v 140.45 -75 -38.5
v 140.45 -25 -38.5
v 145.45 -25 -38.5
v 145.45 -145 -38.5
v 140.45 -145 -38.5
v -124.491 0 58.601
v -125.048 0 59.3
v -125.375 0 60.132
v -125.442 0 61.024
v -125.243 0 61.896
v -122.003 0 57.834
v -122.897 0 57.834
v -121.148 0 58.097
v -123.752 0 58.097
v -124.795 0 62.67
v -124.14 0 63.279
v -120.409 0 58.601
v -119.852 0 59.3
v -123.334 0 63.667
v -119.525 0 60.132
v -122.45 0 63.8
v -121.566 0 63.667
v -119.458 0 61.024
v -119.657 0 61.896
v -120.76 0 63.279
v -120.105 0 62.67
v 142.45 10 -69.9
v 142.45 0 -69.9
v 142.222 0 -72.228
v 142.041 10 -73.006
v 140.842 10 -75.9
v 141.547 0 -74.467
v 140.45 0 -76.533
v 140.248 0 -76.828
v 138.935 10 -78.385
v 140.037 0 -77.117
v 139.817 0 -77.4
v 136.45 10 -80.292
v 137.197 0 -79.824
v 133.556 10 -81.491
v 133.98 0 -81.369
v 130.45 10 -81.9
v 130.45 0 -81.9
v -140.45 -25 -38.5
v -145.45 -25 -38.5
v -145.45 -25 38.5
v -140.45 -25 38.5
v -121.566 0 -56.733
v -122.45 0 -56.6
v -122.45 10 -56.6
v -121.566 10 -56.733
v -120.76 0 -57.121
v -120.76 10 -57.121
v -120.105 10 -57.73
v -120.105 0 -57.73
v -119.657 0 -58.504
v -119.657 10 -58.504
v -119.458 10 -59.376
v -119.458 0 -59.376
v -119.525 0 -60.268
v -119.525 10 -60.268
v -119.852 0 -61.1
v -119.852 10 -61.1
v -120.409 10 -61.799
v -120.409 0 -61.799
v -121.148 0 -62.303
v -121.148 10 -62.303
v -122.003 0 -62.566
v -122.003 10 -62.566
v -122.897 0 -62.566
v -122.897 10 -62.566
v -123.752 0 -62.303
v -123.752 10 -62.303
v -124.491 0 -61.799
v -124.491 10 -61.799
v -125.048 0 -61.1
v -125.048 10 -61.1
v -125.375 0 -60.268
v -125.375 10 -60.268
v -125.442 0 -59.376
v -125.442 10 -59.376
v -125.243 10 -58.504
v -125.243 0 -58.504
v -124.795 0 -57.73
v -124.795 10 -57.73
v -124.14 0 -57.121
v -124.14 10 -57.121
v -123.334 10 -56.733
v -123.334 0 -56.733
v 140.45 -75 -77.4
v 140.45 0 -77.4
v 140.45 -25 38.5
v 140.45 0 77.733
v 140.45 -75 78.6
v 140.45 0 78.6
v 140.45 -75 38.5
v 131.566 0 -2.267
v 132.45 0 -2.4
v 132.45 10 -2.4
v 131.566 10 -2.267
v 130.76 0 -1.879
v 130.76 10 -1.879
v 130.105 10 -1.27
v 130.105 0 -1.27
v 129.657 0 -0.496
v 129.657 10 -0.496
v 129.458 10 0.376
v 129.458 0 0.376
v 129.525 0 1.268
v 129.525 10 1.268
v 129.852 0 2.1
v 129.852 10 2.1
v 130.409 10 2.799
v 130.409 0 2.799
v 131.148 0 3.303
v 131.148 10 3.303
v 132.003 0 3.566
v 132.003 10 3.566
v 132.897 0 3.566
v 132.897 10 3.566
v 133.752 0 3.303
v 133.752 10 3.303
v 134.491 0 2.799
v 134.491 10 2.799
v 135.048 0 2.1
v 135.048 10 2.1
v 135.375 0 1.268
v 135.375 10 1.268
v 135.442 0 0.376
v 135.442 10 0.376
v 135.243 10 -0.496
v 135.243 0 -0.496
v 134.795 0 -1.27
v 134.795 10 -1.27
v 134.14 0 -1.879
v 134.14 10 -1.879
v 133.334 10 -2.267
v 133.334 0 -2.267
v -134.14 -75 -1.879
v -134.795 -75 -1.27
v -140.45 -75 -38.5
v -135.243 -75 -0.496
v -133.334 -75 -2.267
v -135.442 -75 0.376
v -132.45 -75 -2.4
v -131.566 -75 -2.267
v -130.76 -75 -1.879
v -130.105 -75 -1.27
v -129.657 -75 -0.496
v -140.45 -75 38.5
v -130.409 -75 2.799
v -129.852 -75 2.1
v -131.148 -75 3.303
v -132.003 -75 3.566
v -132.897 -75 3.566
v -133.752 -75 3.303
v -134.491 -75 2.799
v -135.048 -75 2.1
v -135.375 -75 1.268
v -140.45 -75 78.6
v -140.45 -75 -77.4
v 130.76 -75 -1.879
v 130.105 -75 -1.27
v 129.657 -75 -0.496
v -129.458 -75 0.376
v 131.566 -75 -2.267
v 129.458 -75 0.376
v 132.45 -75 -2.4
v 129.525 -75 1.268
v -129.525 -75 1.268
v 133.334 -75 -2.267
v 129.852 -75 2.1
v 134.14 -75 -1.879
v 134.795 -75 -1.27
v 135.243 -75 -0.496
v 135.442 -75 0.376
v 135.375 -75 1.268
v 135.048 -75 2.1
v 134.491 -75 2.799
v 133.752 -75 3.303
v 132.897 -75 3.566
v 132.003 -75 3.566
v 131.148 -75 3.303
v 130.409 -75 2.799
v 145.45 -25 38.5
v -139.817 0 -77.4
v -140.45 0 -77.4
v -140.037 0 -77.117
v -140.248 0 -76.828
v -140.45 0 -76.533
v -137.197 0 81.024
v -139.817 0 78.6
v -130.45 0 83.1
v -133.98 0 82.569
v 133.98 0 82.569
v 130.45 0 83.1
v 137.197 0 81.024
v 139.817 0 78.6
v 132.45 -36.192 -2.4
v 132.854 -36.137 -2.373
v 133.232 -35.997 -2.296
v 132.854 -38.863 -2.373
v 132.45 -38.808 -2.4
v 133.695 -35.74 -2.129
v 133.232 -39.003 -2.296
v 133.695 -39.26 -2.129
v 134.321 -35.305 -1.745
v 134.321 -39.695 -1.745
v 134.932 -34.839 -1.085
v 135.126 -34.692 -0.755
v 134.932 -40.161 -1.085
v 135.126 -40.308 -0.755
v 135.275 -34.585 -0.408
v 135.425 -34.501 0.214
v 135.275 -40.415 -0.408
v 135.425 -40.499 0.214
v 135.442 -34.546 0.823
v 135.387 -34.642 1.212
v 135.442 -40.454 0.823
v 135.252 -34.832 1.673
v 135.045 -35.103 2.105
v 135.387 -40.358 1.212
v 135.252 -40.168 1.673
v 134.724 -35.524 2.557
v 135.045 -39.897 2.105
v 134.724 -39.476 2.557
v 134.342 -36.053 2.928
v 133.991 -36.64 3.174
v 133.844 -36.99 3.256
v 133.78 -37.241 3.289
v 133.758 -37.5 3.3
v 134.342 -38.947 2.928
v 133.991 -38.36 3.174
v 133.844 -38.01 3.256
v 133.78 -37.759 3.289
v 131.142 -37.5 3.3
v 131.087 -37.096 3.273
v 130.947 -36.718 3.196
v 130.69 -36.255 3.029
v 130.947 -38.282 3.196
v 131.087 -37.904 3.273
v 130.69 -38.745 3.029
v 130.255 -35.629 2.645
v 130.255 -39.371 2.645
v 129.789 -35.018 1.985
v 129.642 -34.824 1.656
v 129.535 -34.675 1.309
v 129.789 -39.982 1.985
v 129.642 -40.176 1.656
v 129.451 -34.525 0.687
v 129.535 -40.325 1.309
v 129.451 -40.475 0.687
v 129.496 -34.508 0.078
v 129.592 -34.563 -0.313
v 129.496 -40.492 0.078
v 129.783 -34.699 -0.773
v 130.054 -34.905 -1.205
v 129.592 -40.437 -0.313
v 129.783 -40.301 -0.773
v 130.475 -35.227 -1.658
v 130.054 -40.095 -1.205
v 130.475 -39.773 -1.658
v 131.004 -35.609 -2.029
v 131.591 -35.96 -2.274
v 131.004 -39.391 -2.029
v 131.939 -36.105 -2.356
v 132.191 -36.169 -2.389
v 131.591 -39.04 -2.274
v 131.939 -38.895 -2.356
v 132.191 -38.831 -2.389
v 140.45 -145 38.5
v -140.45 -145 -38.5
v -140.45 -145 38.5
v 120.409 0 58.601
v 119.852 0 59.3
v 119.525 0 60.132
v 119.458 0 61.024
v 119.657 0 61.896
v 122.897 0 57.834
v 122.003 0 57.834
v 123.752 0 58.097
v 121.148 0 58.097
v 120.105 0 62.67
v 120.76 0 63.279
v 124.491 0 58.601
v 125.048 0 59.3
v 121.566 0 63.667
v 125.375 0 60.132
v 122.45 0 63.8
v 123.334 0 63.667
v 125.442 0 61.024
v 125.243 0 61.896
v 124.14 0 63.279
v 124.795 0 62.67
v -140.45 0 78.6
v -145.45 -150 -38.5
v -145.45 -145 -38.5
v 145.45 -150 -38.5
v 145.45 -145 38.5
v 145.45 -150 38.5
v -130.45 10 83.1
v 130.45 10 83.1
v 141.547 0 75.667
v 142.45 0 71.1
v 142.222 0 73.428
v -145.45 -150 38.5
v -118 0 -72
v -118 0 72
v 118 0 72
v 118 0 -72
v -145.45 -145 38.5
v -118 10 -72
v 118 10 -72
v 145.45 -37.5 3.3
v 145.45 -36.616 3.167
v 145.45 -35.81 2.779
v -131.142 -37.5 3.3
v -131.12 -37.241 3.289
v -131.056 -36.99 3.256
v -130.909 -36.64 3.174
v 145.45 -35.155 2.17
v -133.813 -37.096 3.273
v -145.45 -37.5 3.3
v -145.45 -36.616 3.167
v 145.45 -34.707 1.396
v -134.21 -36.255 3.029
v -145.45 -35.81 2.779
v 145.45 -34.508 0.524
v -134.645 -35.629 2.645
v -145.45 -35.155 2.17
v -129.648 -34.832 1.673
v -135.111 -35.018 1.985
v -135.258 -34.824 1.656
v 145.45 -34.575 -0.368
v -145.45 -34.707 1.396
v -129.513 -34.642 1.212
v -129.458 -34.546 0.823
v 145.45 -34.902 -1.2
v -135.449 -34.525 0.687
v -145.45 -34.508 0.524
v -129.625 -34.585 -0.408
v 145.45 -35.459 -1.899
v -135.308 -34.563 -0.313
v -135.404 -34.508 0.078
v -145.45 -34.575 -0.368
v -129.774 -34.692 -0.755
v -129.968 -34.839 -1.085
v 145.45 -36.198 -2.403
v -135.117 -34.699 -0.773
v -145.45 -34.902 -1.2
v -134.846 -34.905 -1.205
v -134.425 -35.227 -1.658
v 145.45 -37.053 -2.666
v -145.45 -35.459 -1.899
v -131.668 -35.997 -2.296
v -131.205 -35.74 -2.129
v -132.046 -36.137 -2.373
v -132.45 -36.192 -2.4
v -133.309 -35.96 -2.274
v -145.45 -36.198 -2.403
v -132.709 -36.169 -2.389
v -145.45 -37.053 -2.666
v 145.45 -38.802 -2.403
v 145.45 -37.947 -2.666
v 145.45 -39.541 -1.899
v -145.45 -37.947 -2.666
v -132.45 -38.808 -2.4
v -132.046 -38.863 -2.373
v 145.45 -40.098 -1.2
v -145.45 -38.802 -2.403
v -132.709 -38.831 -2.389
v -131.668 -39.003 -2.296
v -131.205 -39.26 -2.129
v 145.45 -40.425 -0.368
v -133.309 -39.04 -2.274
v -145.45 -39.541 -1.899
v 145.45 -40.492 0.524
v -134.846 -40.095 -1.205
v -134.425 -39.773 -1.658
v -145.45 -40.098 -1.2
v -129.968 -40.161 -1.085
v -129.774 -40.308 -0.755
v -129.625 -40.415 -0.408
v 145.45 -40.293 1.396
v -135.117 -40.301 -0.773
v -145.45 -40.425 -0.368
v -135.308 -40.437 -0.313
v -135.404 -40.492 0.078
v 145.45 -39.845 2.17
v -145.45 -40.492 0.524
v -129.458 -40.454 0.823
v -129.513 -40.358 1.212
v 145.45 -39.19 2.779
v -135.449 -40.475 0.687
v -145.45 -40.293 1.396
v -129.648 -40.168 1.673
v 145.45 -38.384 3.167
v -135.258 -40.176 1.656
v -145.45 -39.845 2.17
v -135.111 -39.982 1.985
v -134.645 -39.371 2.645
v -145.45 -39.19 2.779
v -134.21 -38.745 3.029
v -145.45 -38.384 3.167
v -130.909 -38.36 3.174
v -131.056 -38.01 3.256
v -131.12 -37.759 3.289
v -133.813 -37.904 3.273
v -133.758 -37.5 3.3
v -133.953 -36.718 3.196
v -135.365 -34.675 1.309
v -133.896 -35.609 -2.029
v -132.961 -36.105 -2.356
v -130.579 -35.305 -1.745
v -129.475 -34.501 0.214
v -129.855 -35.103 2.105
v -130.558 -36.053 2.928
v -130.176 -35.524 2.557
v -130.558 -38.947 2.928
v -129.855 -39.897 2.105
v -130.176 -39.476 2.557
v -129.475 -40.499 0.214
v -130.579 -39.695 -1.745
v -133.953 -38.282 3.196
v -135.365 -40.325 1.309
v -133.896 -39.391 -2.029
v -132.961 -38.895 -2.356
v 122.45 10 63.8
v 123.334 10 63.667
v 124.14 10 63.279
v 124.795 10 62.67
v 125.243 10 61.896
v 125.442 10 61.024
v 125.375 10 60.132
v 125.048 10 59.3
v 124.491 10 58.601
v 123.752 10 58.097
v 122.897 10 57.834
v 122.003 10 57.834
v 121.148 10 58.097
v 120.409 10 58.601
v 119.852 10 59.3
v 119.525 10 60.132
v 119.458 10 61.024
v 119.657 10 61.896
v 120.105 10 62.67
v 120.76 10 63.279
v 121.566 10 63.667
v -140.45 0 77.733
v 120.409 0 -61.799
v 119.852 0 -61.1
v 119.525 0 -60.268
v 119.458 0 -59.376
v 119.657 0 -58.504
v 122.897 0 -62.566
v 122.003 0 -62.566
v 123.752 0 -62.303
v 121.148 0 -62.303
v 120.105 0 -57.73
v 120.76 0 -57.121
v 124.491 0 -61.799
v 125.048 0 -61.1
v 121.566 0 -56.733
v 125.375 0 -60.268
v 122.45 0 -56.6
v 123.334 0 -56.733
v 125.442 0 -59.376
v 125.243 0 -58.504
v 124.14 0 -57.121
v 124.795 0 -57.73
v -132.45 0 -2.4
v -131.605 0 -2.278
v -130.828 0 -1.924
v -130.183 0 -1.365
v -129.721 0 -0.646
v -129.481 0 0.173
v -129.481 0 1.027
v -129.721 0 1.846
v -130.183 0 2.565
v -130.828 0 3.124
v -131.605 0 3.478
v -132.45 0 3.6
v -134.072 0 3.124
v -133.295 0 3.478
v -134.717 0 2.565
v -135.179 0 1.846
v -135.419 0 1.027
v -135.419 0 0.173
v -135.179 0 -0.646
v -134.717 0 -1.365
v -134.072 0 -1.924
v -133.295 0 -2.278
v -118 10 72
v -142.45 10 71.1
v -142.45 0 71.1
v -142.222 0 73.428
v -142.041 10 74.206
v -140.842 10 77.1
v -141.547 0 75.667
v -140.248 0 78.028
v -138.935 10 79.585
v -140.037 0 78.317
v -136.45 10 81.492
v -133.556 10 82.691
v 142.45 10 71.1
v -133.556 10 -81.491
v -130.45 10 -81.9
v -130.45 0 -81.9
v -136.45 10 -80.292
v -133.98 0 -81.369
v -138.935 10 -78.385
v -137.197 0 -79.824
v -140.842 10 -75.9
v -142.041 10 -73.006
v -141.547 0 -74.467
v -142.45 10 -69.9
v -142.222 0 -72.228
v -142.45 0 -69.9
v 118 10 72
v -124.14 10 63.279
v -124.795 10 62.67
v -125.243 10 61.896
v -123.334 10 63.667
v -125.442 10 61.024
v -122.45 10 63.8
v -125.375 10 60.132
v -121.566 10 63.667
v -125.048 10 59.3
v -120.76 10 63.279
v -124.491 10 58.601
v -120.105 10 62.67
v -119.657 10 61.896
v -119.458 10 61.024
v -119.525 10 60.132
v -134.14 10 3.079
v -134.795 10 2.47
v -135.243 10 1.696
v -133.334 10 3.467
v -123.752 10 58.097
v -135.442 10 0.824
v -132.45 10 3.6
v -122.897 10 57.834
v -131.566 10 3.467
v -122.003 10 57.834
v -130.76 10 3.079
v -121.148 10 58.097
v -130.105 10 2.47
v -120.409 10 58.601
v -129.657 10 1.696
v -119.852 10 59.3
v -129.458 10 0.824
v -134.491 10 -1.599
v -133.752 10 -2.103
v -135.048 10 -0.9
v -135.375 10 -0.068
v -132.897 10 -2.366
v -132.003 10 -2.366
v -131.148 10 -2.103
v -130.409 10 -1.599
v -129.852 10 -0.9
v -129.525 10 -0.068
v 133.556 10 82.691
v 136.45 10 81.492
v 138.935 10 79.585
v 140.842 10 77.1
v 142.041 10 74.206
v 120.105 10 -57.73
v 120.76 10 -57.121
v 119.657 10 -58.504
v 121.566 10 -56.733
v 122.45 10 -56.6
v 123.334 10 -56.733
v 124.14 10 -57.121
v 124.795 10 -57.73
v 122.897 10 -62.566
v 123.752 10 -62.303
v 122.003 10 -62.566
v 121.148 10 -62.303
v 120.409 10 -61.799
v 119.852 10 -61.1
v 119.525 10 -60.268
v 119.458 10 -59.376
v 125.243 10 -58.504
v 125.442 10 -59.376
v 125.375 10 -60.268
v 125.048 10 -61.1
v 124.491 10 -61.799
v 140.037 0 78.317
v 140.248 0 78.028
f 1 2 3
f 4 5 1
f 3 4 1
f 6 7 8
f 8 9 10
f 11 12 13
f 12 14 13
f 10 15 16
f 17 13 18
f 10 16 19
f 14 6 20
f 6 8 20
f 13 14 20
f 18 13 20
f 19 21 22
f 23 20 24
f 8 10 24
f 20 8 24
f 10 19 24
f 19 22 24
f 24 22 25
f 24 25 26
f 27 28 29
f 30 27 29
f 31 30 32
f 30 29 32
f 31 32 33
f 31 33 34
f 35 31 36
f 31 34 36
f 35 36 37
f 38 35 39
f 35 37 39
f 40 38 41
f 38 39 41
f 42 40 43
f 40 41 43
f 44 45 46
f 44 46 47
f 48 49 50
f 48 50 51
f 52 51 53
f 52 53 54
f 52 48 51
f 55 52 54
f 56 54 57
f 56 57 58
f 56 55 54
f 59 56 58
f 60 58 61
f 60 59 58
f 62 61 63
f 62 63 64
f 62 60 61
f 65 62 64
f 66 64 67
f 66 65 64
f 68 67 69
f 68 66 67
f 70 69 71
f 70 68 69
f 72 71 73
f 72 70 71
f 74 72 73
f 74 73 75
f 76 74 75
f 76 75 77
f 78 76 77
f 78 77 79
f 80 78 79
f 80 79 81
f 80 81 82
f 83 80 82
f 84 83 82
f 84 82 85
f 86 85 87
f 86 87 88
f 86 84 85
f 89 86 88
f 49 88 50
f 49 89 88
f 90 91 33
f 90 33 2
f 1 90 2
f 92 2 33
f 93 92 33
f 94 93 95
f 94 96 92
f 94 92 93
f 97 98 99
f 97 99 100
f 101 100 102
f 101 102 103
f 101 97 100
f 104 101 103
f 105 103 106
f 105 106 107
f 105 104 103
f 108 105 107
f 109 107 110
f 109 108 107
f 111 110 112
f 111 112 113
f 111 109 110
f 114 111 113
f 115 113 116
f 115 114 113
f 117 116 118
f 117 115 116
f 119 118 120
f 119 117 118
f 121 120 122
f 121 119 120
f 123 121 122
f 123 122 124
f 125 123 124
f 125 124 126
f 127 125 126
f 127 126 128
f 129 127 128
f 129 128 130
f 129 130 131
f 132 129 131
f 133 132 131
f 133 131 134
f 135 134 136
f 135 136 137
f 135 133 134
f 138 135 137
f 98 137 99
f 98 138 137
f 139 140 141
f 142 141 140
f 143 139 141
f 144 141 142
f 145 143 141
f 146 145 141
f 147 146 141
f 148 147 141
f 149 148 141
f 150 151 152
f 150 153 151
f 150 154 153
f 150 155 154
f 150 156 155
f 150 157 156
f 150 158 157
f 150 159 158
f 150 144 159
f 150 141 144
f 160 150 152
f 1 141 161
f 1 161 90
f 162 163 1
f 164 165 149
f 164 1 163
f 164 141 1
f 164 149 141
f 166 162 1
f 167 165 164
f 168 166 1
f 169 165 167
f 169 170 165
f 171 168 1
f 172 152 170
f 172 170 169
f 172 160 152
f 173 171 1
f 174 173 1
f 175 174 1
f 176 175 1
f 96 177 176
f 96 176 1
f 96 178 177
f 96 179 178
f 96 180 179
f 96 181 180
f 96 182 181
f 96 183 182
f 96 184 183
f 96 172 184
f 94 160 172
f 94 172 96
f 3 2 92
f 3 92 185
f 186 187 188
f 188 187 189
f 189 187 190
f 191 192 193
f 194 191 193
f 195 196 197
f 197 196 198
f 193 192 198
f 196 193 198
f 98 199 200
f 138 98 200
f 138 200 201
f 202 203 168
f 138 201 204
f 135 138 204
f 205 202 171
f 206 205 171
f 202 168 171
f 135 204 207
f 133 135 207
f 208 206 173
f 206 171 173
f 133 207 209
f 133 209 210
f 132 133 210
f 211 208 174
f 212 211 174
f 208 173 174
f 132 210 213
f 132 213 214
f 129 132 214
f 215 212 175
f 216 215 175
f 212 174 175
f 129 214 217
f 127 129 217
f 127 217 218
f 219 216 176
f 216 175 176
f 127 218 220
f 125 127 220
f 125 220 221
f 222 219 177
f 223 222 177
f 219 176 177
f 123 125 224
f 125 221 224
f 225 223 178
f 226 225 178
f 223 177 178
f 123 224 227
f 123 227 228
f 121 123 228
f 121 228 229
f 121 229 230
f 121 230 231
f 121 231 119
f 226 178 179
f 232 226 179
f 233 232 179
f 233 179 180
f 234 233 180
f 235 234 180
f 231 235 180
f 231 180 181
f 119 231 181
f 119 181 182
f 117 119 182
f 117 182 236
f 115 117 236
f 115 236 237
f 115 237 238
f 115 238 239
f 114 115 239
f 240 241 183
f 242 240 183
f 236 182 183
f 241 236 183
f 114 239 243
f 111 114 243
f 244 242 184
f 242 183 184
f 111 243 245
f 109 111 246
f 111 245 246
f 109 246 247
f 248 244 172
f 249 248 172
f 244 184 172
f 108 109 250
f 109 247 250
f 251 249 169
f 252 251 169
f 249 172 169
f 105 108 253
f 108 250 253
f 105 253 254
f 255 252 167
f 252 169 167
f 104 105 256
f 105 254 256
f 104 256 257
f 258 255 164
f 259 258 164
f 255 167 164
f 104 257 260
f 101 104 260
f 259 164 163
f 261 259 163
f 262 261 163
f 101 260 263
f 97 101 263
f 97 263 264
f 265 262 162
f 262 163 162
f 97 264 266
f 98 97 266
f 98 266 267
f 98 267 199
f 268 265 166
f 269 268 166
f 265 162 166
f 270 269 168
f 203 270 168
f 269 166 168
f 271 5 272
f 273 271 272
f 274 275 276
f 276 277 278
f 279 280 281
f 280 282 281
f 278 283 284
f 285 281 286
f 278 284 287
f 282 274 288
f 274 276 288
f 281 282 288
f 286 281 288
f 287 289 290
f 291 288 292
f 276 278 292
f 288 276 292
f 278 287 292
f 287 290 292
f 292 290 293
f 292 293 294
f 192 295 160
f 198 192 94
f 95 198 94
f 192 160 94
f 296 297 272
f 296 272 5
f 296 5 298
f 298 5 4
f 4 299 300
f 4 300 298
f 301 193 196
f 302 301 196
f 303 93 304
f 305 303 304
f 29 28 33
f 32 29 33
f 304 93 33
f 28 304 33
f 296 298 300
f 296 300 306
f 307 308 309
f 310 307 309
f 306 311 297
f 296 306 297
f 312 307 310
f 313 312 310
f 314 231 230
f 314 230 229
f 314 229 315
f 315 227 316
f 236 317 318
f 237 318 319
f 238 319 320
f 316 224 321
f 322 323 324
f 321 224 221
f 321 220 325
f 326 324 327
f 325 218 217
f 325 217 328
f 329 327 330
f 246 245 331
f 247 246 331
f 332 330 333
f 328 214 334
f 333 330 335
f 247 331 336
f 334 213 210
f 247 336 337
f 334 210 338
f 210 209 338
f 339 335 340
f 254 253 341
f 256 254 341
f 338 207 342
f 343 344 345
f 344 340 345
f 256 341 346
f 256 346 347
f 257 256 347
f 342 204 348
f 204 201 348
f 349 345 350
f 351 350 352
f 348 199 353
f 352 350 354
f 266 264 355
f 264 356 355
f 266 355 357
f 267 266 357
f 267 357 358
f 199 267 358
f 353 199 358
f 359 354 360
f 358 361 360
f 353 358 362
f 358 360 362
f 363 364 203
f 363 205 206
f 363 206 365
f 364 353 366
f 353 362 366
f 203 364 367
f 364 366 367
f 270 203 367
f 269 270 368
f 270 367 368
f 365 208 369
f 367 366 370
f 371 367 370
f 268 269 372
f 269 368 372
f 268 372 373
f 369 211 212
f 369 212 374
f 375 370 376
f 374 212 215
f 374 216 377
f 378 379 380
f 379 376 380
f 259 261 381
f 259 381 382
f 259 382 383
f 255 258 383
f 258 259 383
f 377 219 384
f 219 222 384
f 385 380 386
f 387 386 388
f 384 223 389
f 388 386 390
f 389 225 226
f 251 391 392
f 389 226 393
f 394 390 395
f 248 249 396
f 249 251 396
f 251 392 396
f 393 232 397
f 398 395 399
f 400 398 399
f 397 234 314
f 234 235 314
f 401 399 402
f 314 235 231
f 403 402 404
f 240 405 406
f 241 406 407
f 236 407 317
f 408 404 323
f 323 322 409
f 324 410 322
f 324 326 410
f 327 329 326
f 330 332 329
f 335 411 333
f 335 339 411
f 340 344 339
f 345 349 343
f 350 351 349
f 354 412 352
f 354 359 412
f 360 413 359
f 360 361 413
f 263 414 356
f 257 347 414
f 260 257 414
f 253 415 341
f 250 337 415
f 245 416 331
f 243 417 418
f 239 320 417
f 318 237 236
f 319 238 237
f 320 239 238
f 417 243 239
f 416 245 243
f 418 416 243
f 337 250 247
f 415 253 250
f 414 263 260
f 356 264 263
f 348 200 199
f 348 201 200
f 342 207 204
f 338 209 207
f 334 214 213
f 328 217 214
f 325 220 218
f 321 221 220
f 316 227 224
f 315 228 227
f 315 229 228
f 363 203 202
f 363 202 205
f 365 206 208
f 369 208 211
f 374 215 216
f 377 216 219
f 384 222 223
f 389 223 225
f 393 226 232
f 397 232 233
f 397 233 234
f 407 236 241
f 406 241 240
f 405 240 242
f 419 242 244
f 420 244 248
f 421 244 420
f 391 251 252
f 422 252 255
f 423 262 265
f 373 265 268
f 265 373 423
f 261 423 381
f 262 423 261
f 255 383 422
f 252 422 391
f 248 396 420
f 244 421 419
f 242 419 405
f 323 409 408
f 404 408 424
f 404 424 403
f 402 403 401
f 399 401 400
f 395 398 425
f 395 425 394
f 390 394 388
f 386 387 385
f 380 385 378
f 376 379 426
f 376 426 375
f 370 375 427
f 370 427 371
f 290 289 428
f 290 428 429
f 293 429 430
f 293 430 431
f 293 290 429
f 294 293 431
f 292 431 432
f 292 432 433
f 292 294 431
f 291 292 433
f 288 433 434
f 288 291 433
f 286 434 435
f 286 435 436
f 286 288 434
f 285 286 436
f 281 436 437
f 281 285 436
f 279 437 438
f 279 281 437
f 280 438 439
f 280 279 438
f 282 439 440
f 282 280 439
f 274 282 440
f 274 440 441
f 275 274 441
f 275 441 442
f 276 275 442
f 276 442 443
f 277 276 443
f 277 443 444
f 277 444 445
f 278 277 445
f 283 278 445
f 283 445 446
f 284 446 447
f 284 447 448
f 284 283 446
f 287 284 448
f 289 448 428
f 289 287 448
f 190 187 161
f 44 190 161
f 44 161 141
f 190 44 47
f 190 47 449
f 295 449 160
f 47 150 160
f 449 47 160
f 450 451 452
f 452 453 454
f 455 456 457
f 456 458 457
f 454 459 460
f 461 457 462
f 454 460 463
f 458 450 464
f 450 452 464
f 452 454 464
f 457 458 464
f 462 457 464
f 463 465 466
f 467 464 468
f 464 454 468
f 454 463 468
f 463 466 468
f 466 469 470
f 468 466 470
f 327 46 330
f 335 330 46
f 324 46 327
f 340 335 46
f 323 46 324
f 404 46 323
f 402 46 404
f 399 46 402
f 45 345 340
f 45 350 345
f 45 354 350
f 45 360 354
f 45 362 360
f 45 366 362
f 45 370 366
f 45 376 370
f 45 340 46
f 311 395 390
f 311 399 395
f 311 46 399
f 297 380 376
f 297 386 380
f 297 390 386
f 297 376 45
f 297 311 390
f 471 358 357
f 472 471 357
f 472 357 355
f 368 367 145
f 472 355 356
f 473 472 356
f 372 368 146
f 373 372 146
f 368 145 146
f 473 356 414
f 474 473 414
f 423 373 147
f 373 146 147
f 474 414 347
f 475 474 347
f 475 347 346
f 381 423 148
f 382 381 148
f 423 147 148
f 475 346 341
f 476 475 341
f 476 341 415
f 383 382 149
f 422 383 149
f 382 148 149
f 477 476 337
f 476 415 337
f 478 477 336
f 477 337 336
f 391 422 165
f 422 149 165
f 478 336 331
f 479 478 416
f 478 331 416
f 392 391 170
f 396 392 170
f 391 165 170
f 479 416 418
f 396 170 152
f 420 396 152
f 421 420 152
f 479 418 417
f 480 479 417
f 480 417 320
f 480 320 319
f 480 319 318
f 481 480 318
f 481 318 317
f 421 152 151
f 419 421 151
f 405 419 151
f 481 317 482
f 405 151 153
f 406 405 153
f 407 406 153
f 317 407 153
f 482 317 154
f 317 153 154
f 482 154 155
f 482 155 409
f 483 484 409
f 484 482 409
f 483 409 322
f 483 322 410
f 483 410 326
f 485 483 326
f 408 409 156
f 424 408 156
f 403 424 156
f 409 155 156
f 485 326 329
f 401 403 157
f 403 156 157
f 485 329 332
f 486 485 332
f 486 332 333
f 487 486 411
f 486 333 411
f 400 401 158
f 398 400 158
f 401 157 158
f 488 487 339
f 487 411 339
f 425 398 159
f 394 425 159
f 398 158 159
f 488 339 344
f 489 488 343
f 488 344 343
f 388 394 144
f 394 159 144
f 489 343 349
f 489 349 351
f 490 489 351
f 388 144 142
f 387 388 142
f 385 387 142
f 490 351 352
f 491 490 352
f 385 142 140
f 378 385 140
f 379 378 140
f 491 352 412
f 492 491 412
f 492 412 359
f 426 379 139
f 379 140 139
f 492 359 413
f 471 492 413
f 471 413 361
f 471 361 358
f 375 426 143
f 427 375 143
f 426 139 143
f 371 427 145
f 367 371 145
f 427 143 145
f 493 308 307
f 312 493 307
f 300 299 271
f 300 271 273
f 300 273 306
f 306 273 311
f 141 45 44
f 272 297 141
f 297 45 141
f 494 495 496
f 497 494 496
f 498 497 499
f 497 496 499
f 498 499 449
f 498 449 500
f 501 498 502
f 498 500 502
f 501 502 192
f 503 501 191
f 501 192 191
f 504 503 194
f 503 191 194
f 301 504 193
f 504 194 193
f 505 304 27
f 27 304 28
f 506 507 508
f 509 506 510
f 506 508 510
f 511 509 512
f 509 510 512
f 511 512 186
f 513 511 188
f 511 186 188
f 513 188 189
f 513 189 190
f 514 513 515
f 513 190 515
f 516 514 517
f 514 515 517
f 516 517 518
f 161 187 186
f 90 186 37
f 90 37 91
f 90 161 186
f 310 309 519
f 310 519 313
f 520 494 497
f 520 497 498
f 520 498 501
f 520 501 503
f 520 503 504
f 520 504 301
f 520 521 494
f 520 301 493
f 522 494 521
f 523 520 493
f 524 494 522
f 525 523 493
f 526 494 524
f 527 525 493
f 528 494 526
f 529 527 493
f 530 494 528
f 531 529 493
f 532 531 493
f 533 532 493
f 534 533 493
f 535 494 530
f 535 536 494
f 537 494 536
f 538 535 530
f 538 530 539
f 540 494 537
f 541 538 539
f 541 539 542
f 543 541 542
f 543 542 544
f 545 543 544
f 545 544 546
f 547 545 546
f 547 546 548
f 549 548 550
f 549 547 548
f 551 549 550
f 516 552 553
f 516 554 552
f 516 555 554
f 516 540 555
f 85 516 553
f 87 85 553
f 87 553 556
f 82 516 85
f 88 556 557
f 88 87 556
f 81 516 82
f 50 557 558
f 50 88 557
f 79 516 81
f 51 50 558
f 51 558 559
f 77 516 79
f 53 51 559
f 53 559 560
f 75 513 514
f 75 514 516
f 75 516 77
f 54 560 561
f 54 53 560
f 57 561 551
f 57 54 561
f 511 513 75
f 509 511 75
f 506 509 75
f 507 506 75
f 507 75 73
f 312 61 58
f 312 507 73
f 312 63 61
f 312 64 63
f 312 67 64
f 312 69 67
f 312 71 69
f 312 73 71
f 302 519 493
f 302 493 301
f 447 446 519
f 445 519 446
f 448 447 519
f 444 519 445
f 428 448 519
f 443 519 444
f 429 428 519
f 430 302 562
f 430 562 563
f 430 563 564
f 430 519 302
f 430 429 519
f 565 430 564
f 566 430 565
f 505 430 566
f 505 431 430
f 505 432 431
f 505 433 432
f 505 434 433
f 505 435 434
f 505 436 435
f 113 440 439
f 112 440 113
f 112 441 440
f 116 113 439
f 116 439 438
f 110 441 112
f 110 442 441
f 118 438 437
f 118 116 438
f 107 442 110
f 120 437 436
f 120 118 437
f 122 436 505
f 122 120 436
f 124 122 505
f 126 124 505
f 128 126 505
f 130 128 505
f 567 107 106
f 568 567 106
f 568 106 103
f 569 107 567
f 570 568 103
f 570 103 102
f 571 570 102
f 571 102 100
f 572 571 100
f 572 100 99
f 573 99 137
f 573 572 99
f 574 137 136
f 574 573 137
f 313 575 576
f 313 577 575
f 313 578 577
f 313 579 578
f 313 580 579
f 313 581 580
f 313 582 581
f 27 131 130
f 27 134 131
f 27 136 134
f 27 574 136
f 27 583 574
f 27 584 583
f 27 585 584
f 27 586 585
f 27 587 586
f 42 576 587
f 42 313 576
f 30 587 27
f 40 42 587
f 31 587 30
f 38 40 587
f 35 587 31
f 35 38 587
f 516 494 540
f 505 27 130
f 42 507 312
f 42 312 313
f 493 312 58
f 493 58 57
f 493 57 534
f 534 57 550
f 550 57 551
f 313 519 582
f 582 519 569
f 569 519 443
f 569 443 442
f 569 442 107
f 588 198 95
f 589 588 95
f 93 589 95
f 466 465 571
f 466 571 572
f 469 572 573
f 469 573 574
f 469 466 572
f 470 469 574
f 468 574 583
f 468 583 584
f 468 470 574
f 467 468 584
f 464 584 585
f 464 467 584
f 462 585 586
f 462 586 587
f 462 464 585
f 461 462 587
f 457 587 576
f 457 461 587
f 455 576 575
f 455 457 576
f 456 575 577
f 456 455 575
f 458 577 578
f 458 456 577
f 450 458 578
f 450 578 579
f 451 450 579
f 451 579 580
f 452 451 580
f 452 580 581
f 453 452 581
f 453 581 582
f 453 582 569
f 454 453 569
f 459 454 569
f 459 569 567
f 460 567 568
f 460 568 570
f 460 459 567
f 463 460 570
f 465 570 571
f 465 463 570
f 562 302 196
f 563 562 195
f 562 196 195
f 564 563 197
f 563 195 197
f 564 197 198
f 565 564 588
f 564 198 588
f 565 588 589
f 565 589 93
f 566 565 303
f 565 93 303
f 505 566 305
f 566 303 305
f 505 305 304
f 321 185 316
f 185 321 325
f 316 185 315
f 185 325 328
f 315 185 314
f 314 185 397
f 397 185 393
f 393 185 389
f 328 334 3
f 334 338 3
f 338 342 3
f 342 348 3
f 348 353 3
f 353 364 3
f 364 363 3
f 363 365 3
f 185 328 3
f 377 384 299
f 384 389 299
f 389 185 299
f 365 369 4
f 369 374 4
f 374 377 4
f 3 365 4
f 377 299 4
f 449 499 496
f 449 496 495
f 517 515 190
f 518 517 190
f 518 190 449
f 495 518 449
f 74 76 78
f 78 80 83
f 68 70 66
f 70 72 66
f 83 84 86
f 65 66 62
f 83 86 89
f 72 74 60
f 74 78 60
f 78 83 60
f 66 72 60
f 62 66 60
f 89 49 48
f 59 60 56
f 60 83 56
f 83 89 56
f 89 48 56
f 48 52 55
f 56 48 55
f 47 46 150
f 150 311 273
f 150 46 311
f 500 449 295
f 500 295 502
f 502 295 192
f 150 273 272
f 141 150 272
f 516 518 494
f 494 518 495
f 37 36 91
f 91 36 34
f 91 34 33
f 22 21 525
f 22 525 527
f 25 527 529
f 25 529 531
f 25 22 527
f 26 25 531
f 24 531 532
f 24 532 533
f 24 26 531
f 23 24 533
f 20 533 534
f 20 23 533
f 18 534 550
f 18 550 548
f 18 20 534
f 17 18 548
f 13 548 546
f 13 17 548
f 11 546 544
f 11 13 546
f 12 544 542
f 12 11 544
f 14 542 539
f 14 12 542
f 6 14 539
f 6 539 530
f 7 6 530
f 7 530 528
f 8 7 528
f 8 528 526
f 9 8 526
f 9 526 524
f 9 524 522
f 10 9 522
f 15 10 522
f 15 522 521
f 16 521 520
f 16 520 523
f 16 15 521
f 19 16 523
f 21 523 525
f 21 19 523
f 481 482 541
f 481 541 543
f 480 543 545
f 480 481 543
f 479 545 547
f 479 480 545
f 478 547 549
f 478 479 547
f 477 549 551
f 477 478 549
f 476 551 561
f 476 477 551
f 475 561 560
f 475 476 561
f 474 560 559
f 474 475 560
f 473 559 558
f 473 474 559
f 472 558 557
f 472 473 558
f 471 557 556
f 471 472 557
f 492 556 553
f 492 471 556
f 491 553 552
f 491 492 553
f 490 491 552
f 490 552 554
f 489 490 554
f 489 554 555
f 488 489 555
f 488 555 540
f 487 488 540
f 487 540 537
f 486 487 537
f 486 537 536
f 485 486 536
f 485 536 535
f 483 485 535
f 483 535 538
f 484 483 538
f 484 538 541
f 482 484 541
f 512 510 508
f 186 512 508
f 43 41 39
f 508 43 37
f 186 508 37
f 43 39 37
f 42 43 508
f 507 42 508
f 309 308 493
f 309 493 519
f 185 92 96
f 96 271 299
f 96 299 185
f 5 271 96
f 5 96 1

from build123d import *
from build123d.topology import SkipClean

# Parameters (mm, degrees)
SKETCH5_R           = 3
SKETCH5_W           = 236
SKETCH5_H           = 144
BOSS_EXTRUDE1_DEPTH = 10
BOSS_EXTRUDE2_START = 75
SKETCH7_W           = 280.9
SKETCH7_H           = 156
SKETCH7_R           = 3
BOSS_EXTRUDE2_DEPTH = 75
SKETCH9_W           = 5
SKETCH9_H           = 77
SKETCH9_W_2         = 280.9
BOSS_EXTRUDE3_DEPTH = 5
SKETCH10_W          = 5
SKETCH10_H          = 77
BOSS_EXTRUDE5_DEPTH = 120
SKETCH11_R          = 3
CUT_EXTRUDE1_DEPTH  = 1011


with BuildPart() as part:
    # Sketch5 → Boss-Extrude1 (new body)
    with BuildSketch(Plane(origin=(0, 0, 0), x_dir=(1, 0, 0), z_dir=(0, 1, 0))):
        with BuildLine():
            Line((-142.45, 69.9), (-142.45, -71.1))
            ThreePointArc((-142.45, -71.1), (-138.935281374, -79.585281374), (-130.45, -83.1))
            Line((-130.45, -83.1), (130.45, -83.1))
            ThreePointArc((130.45, -83.1), (138.935281374, -79.585281374), (142.45, -71.1))
            Line((142.45, -71.1), (142.45, 69.9))
            ThreePointArc((142.45, 69.9), (138.935281374, 78.385281374), (130.45, 81.9))
            Line((130.45, 81.9), (-130.45, 81.9))
            ThreePointArc((-130.45, 81.9), (-138.935281374, 78.385281374), (-142.45, 69.9))
        make_face()
        with Locations(Location((-122.45, 59.6, 0), (0, 0, 270))):
            Circle(SKETCH5_R, mode=Mode.SUBTRACT)
        with Locations(Location((-122.45, -60.8, 0), (0, 0, 270))):
            Circle(SKETCH5_R, mode=Mode.SUBTRACT)
        with Locations(Location((122.45, -60.8, 0), (0, 0, 270))):
            Circle(SKETCH5_R, mode=Mode.SUBTRACT)
        with Locations(Location((122.45, 59.6, 0), (0, 0, 270))):
            Circle(SKETCH5_R, mode=Mode.SUBTRACT)
        with Locations(Location((-132.45, -0.6, 0), (0, 0, 270))):
            Circle(SKETCH5_R, mode=Mode.SUBTRACT)
        with Locations(Location((132.45, -0.6, 0), (0, 0, 90))):
            Circle(SKETCH5_R, mode=Mode.SUBTRACT)
        Rectangle(SKETCH5_W, SKETCH5_H, mode=Mode.SUBTRACT)
    extrude(amount=BOSS_EXTRUDE1_DEPTH)

    # Sketch7 → Boss-Extrude2 (add)
    with SkipClean():  # the faces are left unmerged after this step: merging them gives an invalid solid
        with BuildSketch(Plane.XZ.offset(BOSS_EXTRUDE2_START)):
            with Locations((0, 0.6)):
                Rectangle(SKETCH7_W, SKETCH7_H)
            with Locations(Location((132.45, 0.6, 0), (0, 0, 270))):
                Circle(SKETCH7_R, mode=Mode.SUBTRACT)
            with Locations(Location((-132.45, 0.6, 0), (0, 0, 270))):
                Circle(SKETCH7_R, mode=Mode.SUBTRACT)
        extrude(amount=-BOSS_EXTRUDE2_DEPTH)



with BuildPart() as body_2:
    # Sketch9 → Boss-Extrude3 (new body)
    with BuildSketch(Plane(origin=(0, -145, 0), x_dir=(-1, 0, 0), z_dir=(0, -1, 0))):
        with Locations((-142.95, 0)):
            Rectangle(SKETCH9_W, SKETCH9_H)
        Rectangle(SKETCH9_W_2, SKETCH9_H)
        with Locations((142.95, 0)):
            Rectangle(SKETCH9_W, SKETCH9_H)
    extrude(amount=BOSS_EXTRUDE3_DEPTH)


with BuildPart() as part_1:
    with SkipClean():  # the faces are left unmerged after this step: merging them gives an invalid solid
        add(part.part)

        add(body_2.part)  # Boss-Extrude5 merges body 2
        # Sketch10 → Boss-Extrude5 (add)
        with BuildSketch(Plane(origin=(0, -145, 0), x_dir=(1, 0, 0), z_dir=(0, 1, 0))):
            with Locations((-142.95, 0)):
                Rectangle(SKETCH10_W, SKETCH10_H)
            with Locations((142.95, 0)):
                Rectangle(SKETCH10_W, SKETCH10_H)
        extrude(amount=BOSS_EXTRUDE5_DEPTH)

    # Sketch11 → Cut-Extrude1 (cut)
    with SkipClean():  # the faces are left unmerged after this step: merging them gives an invalid solid
        with BuildSketch(Plane.ZY.offset(145.45)):
            with Locations((0.3, -37.5)):
                Circle(SKETCH11_R)
        extrude(amount=-CUT_EXTRUDE1_DEPTH, mode=Mode.SUBTRACT)


solid = part_1.part
